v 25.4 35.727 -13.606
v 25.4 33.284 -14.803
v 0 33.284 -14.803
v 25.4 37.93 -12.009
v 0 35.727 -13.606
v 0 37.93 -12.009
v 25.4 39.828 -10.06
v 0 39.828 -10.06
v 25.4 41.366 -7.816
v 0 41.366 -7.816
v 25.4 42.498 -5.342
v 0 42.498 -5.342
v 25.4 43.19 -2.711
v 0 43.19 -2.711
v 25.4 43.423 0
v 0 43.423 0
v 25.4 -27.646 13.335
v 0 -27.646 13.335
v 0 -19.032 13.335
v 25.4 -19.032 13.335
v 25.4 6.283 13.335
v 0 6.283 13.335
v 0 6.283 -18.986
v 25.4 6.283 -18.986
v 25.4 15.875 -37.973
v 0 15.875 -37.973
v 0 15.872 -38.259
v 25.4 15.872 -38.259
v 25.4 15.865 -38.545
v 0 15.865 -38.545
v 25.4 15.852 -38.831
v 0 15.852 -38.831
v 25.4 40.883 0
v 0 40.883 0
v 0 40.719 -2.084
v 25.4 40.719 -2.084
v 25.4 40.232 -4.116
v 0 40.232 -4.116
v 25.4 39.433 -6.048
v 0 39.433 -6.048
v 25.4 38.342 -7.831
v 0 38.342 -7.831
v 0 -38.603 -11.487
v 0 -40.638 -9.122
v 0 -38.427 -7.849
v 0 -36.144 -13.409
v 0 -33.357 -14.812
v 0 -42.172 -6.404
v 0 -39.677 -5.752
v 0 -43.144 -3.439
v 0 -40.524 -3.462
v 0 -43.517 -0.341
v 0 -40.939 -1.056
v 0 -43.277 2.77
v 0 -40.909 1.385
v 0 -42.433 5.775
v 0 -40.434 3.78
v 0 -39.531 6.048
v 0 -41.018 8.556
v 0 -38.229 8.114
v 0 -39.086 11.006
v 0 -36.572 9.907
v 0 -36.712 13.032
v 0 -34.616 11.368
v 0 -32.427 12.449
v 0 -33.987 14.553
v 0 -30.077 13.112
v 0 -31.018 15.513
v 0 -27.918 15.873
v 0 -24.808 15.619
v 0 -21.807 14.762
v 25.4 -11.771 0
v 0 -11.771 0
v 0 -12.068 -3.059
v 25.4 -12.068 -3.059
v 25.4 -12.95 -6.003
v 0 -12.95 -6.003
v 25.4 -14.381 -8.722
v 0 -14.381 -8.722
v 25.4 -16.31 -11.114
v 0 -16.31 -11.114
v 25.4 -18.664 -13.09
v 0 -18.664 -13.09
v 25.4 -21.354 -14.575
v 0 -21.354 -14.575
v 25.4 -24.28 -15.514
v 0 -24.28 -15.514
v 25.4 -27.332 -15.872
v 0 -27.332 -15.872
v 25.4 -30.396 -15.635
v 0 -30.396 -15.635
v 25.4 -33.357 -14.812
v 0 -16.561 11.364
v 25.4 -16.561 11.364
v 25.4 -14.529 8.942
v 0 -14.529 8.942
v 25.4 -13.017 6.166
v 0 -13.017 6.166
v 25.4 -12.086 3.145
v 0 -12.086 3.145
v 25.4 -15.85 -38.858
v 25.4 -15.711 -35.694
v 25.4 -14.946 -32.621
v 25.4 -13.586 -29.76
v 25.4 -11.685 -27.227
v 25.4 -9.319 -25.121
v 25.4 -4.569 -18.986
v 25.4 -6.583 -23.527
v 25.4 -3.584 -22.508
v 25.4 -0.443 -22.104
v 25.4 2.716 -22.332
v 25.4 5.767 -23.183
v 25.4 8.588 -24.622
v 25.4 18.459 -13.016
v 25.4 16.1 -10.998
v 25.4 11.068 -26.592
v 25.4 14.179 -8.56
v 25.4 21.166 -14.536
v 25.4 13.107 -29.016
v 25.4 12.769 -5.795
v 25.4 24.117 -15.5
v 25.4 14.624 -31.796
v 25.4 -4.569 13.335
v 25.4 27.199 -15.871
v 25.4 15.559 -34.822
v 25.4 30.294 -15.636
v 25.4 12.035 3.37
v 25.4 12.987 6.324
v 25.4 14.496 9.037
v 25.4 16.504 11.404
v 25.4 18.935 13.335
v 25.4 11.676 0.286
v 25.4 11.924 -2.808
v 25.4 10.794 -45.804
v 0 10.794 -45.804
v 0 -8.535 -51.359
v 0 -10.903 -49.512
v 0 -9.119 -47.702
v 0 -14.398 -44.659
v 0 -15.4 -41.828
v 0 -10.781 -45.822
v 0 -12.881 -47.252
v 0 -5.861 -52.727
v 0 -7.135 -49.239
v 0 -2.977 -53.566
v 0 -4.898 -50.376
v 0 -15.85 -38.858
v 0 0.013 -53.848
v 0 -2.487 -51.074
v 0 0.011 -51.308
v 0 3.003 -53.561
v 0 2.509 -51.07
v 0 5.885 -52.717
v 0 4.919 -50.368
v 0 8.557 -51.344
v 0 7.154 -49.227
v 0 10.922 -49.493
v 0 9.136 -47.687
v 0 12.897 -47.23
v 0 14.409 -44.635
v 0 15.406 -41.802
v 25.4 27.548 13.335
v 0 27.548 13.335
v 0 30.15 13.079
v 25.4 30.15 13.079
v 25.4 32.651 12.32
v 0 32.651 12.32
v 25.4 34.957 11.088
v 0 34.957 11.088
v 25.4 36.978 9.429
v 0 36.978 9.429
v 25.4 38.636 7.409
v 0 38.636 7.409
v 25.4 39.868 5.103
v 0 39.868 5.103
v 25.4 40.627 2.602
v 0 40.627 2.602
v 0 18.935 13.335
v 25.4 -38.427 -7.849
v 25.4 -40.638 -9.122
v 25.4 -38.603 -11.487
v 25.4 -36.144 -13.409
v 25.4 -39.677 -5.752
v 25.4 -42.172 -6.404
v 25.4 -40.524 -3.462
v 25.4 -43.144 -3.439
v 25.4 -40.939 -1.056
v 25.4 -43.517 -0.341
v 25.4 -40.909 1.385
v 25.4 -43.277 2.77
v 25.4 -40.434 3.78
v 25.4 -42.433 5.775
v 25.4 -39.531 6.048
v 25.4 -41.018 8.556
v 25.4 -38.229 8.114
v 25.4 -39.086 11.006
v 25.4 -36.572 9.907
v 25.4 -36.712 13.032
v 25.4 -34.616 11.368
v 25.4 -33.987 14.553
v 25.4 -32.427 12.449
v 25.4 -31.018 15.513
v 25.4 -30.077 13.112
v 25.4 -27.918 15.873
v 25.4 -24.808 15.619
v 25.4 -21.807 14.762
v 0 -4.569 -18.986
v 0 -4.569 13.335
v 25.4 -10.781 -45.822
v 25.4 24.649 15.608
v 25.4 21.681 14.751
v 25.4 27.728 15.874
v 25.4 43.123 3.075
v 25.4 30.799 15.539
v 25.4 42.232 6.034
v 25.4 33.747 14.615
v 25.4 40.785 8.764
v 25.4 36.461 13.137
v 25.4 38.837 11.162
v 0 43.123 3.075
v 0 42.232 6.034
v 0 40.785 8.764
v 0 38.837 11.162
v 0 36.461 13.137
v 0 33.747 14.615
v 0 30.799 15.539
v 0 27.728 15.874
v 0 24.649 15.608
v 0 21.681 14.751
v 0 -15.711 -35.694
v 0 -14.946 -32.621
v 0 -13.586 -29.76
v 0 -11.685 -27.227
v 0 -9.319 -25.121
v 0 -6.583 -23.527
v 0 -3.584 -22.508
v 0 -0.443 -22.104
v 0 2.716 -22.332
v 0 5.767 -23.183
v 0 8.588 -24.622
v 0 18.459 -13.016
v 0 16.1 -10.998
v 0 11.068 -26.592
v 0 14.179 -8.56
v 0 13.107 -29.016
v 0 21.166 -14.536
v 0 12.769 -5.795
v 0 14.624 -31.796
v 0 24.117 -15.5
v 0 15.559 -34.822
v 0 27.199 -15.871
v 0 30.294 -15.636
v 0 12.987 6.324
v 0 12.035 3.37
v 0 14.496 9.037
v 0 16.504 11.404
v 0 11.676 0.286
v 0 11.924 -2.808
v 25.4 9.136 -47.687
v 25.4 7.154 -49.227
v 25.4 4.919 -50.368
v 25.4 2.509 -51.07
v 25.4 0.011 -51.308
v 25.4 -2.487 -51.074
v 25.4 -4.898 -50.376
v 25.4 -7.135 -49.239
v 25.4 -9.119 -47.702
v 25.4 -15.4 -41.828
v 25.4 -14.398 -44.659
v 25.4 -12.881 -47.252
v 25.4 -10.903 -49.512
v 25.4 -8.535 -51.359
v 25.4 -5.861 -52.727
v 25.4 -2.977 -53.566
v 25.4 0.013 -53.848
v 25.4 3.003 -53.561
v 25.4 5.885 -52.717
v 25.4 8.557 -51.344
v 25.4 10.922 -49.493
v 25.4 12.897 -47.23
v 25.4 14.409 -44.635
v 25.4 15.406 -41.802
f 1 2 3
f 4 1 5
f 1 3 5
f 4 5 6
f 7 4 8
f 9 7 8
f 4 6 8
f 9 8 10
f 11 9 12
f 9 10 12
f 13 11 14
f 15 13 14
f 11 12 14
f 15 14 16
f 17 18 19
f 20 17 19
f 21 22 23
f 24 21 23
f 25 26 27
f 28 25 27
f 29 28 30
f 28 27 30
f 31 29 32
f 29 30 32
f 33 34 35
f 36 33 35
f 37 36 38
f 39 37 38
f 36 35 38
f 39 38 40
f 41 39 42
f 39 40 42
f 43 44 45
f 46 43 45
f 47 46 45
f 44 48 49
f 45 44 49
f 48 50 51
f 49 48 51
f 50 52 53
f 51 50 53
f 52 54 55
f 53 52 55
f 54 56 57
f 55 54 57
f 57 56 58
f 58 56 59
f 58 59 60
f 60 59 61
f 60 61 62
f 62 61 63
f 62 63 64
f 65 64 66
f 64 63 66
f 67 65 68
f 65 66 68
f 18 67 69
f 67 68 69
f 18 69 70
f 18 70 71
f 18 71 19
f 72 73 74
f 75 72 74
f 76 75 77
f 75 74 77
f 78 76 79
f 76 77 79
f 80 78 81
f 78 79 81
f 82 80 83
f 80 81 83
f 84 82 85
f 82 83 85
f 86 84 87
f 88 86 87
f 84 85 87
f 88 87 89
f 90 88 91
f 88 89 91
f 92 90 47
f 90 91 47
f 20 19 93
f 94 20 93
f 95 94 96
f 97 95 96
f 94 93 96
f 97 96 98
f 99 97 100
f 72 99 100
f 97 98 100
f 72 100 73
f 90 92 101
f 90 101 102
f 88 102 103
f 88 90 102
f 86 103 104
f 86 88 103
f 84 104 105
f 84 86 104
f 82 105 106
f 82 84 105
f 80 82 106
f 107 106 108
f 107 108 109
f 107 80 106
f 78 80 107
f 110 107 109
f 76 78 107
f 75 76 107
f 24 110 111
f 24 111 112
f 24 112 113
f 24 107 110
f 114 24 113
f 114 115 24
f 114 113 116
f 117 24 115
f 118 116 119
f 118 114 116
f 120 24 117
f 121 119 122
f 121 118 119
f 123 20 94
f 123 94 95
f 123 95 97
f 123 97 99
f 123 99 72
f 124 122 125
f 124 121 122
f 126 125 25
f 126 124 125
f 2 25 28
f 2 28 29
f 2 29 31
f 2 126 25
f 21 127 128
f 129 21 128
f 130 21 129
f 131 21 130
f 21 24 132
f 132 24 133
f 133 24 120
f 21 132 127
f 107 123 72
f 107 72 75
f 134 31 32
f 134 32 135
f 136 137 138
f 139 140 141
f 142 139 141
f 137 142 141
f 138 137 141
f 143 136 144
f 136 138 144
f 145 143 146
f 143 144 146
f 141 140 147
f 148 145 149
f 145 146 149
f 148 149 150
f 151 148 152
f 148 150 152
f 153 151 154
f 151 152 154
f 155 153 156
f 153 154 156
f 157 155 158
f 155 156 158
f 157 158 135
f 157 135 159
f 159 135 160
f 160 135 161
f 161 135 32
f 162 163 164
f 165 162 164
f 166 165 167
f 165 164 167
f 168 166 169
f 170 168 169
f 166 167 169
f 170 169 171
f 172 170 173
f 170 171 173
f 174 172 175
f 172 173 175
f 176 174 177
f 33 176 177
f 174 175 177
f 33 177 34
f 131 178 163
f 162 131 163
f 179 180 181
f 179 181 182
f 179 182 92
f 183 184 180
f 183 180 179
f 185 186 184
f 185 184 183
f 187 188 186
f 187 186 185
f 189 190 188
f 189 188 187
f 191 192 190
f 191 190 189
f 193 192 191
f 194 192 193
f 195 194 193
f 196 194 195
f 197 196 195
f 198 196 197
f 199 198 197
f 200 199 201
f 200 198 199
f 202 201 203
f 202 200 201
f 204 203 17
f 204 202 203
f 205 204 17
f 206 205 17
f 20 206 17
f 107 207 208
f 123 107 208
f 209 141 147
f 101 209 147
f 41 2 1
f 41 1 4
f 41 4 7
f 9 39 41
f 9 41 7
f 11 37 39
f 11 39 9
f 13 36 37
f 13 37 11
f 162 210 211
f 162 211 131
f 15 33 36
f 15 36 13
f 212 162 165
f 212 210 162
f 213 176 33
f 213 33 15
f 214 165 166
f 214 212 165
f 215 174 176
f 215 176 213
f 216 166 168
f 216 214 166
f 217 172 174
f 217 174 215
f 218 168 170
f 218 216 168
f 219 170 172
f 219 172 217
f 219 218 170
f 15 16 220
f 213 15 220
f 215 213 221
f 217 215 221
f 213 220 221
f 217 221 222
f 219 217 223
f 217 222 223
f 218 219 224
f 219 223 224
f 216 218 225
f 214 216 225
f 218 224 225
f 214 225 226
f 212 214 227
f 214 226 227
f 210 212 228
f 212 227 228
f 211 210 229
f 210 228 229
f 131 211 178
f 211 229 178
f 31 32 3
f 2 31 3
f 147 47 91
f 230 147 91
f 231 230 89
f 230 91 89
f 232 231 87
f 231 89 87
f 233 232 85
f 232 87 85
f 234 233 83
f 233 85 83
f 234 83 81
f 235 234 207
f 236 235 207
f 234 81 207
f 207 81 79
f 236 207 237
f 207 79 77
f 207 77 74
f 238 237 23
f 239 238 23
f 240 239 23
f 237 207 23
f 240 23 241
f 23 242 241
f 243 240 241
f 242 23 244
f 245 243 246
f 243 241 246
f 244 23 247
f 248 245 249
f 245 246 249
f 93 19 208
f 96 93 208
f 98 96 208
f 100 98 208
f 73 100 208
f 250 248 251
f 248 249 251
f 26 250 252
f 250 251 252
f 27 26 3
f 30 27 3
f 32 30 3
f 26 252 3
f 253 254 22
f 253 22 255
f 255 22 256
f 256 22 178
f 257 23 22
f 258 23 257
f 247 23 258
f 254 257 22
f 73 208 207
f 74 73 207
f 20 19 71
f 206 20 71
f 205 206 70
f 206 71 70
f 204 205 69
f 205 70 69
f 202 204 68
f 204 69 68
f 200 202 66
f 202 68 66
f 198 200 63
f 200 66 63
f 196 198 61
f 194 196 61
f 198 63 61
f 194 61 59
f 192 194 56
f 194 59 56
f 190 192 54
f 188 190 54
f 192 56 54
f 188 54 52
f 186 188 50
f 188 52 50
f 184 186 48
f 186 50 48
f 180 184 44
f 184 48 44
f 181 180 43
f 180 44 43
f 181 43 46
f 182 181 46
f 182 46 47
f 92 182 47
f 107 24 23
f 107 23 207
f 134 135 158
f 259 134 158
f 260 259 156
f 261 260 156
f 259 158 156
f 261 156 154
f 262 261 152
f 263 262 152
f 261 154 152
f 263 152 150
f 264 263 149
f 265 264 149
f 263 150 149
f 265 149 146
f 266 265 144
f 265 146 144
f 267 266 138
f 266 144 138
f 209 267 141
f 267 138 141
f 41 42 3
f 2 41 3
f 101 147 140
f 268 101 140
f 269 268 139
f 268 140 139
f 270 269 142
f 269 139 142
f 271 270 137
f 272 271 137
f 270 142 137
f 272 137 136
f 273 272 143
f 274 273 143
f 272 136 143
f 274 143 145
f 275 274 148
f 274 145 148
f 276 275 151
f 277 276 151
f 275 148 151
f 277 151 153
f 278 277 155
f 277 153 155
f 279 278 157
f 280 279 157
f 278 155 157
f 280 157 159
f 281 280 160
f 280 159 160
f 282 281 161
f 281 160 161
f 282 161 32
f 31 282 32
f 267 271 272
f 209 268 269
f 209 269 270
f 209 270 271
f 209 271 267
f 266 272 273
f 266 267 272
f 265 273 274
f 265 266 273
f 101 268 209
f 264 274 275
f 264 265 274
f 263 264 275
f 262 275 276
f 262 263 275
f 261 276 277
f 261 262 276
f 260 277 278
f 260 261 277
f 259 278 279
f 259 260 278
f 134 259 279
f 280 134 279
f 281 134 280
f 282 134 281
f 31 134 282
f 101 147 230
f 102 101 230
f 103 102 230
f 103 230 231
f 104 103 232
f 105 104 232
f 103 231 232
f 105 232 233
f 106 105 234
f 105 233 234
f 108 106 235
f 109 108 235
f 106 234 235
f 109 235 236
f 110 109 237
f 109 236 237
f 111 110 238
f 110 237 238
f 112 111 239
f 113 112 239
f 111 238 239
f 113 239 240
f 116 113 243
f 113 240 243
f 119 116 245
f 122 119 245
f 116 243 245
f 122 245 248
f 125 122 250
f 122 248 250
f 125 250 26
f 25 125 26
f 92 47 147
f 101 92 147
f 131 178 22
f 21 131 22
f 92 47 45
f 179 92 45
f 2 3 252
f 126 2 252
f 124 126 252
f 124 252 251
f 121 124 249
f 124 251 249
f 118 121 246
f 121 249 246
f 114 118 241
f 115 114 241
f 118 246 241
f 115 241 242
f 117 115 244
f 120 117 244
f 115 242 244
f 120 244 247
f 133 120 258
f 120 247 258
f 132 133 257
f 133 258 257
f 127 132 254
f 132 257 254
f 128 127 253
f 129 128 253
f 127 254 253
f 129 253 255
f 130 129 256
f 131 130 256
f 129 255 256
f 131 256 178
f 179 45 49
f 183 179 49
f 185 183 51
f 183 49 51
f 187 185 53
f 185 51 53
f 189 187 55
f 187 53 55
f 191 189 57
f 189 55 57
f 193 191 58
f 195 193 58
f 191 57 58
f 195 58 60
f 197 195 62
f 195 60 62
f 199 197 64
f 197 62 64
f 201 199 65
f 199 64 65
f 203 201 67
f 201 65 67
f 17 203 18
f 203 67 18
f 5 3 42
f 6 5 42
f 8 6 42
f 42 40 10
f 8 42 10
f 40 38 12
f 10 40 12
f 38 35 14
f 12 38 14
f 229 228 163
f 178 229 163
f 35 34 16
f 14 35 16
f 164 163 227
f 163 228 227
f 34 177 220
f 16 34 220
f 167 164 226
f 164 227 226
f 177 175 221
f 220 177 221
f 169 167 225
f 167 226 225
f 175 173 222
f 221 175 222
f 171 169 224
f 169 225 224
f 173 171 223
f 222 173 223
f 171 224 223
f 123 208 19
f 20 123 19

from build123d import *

# Parameters (mm, degrees)
F1_DEPTH = 25.4


with BuildPart() as f1:
    # F0 (on Right) → F1 (new body)
    with BuildSketch(Plane.YZ):
        with BuildLine():
            Line((-4.5691584237, 13.335), (-19.0324015576, 13.335))
            ThreePointArc((-19.0324015576, 13.335), (-13.7040117879, 7.5919488482), (-11.7709606361, 0))
            ThreePointArc((-11.7709606361, 0), (-18.663843779, -13.0895837125), (-33.3567498349, -14.8122419548))
            Line((-33.3567498349, -14.8122419548), (-15.8503038291, -38.8581516965))
            ThreePointArc((-15.8503038291, -38.8581516965), (-0.4427480736, -22.1041752438), (15.875, -37.973))
            ThreePointArc((15.875, -37.973), (15.8691919243, -38.4023863878), (15.8517719471, -38.8314585824))
            Line((15.8517719471, -38.8314585824), (33.2839642315, -14.8026040021))
            ThreePointArc((33.2839642315, -14.8026040021), (13.4060446197, -7.21206994), (18.9346802853, 13.335))
            Line((18.9346802853, 13.335), (6.2826029025, 13.335))
            Line((6.2826029025, 13.335), (6.2826029025, -18.9864552424))
            Line((6.2826029025, -18.9864552424), (-4.5691584237, -18.9864552424))
            Line((-4.5691584237, -18.9864552424), (-4.5691584237, 13.335))
        make_face()
    extrude(amount=F1_DEPTH)


with BuildPart() as f1b:
    # F0 (on Right) → F1, piece 2 (new body)
    with BuildSketch(Plane.YZ):
        with BuildLine():
            Line((-10.7805465139, -45.8216968256), (-15.8503038291, -38.8581516965))
            ThreePointArc((-15.8503038291, -38.8581516965), (0.0133667284, -53.8479943726), (15.8517719471, -38.8314585824))
            Line((15.8517719471, -38.8314585824), (10.7937484074, -45.8035312922))
            ThreePointArc((10.7937484074, -45.8035312922), (0.0112280519, -51.307995273), (-10.7805465139, -45.8216968256))
        make_face()
    extrude(amount=F1_DEPTH)


with BuildPart() as f1c:
    # F0 (on Right) → F1, piece 3 (new body)
    with BuildSketch(Plane.YZ):
        with BuildLine():
            ThreePointArc((-38.4265071501, -7.8486968256), (-39.5305009548, 6.0481341267), (-27.6459606361, 13.335))
            Line((-27.6459606361, 13.335), (-19.0324015576, 13.335))
            ThreePointArc((-19.0324015576, 13.335), (-41.7942229202, 7.2001596747), (-33.3567498349, -14.8122419548))
            Line((-33.3567498349, -14.8122419548), (-38.4265071501, -7.8486968256))
        make_face()
    extrude(amount=F1_DEPTH)


with BuildPart() as f1d:
    # F0 (on Right) → F1, piece 4 (new body)
    with BuildSketch(Plane.YZ):
        with BuildLine():
            ThreePointArc((43.4232393639, 0), (35.1401882121, 13.9419488482), (18.9346802853, 13.335))
            Line((18.9346802853, 13.335), (27.5482393639, 13.335))
            ThreePointArc((27.5482393639, 13.335), (36.977508291, 9.4292689271), (40.8832393639, 0))
            ThreePointArc((40.8832393639, 0), (40.2320254708, -4.1162841245), (38.3419877712, -7.8305312922))
            Line((38.3419877712, -7.8305312922), (33.2839642315, -14.8026040021))
            ThreePointArc((33.2839642315, -14.8026040021), (40.6453813665, -8.9710922614), (43.4232393639, 0))
        make_face()
    extrude(amount=F1_DEPTH)


solid = Compound([f1.part, f1b.part, f1c.part, f1d.part])
